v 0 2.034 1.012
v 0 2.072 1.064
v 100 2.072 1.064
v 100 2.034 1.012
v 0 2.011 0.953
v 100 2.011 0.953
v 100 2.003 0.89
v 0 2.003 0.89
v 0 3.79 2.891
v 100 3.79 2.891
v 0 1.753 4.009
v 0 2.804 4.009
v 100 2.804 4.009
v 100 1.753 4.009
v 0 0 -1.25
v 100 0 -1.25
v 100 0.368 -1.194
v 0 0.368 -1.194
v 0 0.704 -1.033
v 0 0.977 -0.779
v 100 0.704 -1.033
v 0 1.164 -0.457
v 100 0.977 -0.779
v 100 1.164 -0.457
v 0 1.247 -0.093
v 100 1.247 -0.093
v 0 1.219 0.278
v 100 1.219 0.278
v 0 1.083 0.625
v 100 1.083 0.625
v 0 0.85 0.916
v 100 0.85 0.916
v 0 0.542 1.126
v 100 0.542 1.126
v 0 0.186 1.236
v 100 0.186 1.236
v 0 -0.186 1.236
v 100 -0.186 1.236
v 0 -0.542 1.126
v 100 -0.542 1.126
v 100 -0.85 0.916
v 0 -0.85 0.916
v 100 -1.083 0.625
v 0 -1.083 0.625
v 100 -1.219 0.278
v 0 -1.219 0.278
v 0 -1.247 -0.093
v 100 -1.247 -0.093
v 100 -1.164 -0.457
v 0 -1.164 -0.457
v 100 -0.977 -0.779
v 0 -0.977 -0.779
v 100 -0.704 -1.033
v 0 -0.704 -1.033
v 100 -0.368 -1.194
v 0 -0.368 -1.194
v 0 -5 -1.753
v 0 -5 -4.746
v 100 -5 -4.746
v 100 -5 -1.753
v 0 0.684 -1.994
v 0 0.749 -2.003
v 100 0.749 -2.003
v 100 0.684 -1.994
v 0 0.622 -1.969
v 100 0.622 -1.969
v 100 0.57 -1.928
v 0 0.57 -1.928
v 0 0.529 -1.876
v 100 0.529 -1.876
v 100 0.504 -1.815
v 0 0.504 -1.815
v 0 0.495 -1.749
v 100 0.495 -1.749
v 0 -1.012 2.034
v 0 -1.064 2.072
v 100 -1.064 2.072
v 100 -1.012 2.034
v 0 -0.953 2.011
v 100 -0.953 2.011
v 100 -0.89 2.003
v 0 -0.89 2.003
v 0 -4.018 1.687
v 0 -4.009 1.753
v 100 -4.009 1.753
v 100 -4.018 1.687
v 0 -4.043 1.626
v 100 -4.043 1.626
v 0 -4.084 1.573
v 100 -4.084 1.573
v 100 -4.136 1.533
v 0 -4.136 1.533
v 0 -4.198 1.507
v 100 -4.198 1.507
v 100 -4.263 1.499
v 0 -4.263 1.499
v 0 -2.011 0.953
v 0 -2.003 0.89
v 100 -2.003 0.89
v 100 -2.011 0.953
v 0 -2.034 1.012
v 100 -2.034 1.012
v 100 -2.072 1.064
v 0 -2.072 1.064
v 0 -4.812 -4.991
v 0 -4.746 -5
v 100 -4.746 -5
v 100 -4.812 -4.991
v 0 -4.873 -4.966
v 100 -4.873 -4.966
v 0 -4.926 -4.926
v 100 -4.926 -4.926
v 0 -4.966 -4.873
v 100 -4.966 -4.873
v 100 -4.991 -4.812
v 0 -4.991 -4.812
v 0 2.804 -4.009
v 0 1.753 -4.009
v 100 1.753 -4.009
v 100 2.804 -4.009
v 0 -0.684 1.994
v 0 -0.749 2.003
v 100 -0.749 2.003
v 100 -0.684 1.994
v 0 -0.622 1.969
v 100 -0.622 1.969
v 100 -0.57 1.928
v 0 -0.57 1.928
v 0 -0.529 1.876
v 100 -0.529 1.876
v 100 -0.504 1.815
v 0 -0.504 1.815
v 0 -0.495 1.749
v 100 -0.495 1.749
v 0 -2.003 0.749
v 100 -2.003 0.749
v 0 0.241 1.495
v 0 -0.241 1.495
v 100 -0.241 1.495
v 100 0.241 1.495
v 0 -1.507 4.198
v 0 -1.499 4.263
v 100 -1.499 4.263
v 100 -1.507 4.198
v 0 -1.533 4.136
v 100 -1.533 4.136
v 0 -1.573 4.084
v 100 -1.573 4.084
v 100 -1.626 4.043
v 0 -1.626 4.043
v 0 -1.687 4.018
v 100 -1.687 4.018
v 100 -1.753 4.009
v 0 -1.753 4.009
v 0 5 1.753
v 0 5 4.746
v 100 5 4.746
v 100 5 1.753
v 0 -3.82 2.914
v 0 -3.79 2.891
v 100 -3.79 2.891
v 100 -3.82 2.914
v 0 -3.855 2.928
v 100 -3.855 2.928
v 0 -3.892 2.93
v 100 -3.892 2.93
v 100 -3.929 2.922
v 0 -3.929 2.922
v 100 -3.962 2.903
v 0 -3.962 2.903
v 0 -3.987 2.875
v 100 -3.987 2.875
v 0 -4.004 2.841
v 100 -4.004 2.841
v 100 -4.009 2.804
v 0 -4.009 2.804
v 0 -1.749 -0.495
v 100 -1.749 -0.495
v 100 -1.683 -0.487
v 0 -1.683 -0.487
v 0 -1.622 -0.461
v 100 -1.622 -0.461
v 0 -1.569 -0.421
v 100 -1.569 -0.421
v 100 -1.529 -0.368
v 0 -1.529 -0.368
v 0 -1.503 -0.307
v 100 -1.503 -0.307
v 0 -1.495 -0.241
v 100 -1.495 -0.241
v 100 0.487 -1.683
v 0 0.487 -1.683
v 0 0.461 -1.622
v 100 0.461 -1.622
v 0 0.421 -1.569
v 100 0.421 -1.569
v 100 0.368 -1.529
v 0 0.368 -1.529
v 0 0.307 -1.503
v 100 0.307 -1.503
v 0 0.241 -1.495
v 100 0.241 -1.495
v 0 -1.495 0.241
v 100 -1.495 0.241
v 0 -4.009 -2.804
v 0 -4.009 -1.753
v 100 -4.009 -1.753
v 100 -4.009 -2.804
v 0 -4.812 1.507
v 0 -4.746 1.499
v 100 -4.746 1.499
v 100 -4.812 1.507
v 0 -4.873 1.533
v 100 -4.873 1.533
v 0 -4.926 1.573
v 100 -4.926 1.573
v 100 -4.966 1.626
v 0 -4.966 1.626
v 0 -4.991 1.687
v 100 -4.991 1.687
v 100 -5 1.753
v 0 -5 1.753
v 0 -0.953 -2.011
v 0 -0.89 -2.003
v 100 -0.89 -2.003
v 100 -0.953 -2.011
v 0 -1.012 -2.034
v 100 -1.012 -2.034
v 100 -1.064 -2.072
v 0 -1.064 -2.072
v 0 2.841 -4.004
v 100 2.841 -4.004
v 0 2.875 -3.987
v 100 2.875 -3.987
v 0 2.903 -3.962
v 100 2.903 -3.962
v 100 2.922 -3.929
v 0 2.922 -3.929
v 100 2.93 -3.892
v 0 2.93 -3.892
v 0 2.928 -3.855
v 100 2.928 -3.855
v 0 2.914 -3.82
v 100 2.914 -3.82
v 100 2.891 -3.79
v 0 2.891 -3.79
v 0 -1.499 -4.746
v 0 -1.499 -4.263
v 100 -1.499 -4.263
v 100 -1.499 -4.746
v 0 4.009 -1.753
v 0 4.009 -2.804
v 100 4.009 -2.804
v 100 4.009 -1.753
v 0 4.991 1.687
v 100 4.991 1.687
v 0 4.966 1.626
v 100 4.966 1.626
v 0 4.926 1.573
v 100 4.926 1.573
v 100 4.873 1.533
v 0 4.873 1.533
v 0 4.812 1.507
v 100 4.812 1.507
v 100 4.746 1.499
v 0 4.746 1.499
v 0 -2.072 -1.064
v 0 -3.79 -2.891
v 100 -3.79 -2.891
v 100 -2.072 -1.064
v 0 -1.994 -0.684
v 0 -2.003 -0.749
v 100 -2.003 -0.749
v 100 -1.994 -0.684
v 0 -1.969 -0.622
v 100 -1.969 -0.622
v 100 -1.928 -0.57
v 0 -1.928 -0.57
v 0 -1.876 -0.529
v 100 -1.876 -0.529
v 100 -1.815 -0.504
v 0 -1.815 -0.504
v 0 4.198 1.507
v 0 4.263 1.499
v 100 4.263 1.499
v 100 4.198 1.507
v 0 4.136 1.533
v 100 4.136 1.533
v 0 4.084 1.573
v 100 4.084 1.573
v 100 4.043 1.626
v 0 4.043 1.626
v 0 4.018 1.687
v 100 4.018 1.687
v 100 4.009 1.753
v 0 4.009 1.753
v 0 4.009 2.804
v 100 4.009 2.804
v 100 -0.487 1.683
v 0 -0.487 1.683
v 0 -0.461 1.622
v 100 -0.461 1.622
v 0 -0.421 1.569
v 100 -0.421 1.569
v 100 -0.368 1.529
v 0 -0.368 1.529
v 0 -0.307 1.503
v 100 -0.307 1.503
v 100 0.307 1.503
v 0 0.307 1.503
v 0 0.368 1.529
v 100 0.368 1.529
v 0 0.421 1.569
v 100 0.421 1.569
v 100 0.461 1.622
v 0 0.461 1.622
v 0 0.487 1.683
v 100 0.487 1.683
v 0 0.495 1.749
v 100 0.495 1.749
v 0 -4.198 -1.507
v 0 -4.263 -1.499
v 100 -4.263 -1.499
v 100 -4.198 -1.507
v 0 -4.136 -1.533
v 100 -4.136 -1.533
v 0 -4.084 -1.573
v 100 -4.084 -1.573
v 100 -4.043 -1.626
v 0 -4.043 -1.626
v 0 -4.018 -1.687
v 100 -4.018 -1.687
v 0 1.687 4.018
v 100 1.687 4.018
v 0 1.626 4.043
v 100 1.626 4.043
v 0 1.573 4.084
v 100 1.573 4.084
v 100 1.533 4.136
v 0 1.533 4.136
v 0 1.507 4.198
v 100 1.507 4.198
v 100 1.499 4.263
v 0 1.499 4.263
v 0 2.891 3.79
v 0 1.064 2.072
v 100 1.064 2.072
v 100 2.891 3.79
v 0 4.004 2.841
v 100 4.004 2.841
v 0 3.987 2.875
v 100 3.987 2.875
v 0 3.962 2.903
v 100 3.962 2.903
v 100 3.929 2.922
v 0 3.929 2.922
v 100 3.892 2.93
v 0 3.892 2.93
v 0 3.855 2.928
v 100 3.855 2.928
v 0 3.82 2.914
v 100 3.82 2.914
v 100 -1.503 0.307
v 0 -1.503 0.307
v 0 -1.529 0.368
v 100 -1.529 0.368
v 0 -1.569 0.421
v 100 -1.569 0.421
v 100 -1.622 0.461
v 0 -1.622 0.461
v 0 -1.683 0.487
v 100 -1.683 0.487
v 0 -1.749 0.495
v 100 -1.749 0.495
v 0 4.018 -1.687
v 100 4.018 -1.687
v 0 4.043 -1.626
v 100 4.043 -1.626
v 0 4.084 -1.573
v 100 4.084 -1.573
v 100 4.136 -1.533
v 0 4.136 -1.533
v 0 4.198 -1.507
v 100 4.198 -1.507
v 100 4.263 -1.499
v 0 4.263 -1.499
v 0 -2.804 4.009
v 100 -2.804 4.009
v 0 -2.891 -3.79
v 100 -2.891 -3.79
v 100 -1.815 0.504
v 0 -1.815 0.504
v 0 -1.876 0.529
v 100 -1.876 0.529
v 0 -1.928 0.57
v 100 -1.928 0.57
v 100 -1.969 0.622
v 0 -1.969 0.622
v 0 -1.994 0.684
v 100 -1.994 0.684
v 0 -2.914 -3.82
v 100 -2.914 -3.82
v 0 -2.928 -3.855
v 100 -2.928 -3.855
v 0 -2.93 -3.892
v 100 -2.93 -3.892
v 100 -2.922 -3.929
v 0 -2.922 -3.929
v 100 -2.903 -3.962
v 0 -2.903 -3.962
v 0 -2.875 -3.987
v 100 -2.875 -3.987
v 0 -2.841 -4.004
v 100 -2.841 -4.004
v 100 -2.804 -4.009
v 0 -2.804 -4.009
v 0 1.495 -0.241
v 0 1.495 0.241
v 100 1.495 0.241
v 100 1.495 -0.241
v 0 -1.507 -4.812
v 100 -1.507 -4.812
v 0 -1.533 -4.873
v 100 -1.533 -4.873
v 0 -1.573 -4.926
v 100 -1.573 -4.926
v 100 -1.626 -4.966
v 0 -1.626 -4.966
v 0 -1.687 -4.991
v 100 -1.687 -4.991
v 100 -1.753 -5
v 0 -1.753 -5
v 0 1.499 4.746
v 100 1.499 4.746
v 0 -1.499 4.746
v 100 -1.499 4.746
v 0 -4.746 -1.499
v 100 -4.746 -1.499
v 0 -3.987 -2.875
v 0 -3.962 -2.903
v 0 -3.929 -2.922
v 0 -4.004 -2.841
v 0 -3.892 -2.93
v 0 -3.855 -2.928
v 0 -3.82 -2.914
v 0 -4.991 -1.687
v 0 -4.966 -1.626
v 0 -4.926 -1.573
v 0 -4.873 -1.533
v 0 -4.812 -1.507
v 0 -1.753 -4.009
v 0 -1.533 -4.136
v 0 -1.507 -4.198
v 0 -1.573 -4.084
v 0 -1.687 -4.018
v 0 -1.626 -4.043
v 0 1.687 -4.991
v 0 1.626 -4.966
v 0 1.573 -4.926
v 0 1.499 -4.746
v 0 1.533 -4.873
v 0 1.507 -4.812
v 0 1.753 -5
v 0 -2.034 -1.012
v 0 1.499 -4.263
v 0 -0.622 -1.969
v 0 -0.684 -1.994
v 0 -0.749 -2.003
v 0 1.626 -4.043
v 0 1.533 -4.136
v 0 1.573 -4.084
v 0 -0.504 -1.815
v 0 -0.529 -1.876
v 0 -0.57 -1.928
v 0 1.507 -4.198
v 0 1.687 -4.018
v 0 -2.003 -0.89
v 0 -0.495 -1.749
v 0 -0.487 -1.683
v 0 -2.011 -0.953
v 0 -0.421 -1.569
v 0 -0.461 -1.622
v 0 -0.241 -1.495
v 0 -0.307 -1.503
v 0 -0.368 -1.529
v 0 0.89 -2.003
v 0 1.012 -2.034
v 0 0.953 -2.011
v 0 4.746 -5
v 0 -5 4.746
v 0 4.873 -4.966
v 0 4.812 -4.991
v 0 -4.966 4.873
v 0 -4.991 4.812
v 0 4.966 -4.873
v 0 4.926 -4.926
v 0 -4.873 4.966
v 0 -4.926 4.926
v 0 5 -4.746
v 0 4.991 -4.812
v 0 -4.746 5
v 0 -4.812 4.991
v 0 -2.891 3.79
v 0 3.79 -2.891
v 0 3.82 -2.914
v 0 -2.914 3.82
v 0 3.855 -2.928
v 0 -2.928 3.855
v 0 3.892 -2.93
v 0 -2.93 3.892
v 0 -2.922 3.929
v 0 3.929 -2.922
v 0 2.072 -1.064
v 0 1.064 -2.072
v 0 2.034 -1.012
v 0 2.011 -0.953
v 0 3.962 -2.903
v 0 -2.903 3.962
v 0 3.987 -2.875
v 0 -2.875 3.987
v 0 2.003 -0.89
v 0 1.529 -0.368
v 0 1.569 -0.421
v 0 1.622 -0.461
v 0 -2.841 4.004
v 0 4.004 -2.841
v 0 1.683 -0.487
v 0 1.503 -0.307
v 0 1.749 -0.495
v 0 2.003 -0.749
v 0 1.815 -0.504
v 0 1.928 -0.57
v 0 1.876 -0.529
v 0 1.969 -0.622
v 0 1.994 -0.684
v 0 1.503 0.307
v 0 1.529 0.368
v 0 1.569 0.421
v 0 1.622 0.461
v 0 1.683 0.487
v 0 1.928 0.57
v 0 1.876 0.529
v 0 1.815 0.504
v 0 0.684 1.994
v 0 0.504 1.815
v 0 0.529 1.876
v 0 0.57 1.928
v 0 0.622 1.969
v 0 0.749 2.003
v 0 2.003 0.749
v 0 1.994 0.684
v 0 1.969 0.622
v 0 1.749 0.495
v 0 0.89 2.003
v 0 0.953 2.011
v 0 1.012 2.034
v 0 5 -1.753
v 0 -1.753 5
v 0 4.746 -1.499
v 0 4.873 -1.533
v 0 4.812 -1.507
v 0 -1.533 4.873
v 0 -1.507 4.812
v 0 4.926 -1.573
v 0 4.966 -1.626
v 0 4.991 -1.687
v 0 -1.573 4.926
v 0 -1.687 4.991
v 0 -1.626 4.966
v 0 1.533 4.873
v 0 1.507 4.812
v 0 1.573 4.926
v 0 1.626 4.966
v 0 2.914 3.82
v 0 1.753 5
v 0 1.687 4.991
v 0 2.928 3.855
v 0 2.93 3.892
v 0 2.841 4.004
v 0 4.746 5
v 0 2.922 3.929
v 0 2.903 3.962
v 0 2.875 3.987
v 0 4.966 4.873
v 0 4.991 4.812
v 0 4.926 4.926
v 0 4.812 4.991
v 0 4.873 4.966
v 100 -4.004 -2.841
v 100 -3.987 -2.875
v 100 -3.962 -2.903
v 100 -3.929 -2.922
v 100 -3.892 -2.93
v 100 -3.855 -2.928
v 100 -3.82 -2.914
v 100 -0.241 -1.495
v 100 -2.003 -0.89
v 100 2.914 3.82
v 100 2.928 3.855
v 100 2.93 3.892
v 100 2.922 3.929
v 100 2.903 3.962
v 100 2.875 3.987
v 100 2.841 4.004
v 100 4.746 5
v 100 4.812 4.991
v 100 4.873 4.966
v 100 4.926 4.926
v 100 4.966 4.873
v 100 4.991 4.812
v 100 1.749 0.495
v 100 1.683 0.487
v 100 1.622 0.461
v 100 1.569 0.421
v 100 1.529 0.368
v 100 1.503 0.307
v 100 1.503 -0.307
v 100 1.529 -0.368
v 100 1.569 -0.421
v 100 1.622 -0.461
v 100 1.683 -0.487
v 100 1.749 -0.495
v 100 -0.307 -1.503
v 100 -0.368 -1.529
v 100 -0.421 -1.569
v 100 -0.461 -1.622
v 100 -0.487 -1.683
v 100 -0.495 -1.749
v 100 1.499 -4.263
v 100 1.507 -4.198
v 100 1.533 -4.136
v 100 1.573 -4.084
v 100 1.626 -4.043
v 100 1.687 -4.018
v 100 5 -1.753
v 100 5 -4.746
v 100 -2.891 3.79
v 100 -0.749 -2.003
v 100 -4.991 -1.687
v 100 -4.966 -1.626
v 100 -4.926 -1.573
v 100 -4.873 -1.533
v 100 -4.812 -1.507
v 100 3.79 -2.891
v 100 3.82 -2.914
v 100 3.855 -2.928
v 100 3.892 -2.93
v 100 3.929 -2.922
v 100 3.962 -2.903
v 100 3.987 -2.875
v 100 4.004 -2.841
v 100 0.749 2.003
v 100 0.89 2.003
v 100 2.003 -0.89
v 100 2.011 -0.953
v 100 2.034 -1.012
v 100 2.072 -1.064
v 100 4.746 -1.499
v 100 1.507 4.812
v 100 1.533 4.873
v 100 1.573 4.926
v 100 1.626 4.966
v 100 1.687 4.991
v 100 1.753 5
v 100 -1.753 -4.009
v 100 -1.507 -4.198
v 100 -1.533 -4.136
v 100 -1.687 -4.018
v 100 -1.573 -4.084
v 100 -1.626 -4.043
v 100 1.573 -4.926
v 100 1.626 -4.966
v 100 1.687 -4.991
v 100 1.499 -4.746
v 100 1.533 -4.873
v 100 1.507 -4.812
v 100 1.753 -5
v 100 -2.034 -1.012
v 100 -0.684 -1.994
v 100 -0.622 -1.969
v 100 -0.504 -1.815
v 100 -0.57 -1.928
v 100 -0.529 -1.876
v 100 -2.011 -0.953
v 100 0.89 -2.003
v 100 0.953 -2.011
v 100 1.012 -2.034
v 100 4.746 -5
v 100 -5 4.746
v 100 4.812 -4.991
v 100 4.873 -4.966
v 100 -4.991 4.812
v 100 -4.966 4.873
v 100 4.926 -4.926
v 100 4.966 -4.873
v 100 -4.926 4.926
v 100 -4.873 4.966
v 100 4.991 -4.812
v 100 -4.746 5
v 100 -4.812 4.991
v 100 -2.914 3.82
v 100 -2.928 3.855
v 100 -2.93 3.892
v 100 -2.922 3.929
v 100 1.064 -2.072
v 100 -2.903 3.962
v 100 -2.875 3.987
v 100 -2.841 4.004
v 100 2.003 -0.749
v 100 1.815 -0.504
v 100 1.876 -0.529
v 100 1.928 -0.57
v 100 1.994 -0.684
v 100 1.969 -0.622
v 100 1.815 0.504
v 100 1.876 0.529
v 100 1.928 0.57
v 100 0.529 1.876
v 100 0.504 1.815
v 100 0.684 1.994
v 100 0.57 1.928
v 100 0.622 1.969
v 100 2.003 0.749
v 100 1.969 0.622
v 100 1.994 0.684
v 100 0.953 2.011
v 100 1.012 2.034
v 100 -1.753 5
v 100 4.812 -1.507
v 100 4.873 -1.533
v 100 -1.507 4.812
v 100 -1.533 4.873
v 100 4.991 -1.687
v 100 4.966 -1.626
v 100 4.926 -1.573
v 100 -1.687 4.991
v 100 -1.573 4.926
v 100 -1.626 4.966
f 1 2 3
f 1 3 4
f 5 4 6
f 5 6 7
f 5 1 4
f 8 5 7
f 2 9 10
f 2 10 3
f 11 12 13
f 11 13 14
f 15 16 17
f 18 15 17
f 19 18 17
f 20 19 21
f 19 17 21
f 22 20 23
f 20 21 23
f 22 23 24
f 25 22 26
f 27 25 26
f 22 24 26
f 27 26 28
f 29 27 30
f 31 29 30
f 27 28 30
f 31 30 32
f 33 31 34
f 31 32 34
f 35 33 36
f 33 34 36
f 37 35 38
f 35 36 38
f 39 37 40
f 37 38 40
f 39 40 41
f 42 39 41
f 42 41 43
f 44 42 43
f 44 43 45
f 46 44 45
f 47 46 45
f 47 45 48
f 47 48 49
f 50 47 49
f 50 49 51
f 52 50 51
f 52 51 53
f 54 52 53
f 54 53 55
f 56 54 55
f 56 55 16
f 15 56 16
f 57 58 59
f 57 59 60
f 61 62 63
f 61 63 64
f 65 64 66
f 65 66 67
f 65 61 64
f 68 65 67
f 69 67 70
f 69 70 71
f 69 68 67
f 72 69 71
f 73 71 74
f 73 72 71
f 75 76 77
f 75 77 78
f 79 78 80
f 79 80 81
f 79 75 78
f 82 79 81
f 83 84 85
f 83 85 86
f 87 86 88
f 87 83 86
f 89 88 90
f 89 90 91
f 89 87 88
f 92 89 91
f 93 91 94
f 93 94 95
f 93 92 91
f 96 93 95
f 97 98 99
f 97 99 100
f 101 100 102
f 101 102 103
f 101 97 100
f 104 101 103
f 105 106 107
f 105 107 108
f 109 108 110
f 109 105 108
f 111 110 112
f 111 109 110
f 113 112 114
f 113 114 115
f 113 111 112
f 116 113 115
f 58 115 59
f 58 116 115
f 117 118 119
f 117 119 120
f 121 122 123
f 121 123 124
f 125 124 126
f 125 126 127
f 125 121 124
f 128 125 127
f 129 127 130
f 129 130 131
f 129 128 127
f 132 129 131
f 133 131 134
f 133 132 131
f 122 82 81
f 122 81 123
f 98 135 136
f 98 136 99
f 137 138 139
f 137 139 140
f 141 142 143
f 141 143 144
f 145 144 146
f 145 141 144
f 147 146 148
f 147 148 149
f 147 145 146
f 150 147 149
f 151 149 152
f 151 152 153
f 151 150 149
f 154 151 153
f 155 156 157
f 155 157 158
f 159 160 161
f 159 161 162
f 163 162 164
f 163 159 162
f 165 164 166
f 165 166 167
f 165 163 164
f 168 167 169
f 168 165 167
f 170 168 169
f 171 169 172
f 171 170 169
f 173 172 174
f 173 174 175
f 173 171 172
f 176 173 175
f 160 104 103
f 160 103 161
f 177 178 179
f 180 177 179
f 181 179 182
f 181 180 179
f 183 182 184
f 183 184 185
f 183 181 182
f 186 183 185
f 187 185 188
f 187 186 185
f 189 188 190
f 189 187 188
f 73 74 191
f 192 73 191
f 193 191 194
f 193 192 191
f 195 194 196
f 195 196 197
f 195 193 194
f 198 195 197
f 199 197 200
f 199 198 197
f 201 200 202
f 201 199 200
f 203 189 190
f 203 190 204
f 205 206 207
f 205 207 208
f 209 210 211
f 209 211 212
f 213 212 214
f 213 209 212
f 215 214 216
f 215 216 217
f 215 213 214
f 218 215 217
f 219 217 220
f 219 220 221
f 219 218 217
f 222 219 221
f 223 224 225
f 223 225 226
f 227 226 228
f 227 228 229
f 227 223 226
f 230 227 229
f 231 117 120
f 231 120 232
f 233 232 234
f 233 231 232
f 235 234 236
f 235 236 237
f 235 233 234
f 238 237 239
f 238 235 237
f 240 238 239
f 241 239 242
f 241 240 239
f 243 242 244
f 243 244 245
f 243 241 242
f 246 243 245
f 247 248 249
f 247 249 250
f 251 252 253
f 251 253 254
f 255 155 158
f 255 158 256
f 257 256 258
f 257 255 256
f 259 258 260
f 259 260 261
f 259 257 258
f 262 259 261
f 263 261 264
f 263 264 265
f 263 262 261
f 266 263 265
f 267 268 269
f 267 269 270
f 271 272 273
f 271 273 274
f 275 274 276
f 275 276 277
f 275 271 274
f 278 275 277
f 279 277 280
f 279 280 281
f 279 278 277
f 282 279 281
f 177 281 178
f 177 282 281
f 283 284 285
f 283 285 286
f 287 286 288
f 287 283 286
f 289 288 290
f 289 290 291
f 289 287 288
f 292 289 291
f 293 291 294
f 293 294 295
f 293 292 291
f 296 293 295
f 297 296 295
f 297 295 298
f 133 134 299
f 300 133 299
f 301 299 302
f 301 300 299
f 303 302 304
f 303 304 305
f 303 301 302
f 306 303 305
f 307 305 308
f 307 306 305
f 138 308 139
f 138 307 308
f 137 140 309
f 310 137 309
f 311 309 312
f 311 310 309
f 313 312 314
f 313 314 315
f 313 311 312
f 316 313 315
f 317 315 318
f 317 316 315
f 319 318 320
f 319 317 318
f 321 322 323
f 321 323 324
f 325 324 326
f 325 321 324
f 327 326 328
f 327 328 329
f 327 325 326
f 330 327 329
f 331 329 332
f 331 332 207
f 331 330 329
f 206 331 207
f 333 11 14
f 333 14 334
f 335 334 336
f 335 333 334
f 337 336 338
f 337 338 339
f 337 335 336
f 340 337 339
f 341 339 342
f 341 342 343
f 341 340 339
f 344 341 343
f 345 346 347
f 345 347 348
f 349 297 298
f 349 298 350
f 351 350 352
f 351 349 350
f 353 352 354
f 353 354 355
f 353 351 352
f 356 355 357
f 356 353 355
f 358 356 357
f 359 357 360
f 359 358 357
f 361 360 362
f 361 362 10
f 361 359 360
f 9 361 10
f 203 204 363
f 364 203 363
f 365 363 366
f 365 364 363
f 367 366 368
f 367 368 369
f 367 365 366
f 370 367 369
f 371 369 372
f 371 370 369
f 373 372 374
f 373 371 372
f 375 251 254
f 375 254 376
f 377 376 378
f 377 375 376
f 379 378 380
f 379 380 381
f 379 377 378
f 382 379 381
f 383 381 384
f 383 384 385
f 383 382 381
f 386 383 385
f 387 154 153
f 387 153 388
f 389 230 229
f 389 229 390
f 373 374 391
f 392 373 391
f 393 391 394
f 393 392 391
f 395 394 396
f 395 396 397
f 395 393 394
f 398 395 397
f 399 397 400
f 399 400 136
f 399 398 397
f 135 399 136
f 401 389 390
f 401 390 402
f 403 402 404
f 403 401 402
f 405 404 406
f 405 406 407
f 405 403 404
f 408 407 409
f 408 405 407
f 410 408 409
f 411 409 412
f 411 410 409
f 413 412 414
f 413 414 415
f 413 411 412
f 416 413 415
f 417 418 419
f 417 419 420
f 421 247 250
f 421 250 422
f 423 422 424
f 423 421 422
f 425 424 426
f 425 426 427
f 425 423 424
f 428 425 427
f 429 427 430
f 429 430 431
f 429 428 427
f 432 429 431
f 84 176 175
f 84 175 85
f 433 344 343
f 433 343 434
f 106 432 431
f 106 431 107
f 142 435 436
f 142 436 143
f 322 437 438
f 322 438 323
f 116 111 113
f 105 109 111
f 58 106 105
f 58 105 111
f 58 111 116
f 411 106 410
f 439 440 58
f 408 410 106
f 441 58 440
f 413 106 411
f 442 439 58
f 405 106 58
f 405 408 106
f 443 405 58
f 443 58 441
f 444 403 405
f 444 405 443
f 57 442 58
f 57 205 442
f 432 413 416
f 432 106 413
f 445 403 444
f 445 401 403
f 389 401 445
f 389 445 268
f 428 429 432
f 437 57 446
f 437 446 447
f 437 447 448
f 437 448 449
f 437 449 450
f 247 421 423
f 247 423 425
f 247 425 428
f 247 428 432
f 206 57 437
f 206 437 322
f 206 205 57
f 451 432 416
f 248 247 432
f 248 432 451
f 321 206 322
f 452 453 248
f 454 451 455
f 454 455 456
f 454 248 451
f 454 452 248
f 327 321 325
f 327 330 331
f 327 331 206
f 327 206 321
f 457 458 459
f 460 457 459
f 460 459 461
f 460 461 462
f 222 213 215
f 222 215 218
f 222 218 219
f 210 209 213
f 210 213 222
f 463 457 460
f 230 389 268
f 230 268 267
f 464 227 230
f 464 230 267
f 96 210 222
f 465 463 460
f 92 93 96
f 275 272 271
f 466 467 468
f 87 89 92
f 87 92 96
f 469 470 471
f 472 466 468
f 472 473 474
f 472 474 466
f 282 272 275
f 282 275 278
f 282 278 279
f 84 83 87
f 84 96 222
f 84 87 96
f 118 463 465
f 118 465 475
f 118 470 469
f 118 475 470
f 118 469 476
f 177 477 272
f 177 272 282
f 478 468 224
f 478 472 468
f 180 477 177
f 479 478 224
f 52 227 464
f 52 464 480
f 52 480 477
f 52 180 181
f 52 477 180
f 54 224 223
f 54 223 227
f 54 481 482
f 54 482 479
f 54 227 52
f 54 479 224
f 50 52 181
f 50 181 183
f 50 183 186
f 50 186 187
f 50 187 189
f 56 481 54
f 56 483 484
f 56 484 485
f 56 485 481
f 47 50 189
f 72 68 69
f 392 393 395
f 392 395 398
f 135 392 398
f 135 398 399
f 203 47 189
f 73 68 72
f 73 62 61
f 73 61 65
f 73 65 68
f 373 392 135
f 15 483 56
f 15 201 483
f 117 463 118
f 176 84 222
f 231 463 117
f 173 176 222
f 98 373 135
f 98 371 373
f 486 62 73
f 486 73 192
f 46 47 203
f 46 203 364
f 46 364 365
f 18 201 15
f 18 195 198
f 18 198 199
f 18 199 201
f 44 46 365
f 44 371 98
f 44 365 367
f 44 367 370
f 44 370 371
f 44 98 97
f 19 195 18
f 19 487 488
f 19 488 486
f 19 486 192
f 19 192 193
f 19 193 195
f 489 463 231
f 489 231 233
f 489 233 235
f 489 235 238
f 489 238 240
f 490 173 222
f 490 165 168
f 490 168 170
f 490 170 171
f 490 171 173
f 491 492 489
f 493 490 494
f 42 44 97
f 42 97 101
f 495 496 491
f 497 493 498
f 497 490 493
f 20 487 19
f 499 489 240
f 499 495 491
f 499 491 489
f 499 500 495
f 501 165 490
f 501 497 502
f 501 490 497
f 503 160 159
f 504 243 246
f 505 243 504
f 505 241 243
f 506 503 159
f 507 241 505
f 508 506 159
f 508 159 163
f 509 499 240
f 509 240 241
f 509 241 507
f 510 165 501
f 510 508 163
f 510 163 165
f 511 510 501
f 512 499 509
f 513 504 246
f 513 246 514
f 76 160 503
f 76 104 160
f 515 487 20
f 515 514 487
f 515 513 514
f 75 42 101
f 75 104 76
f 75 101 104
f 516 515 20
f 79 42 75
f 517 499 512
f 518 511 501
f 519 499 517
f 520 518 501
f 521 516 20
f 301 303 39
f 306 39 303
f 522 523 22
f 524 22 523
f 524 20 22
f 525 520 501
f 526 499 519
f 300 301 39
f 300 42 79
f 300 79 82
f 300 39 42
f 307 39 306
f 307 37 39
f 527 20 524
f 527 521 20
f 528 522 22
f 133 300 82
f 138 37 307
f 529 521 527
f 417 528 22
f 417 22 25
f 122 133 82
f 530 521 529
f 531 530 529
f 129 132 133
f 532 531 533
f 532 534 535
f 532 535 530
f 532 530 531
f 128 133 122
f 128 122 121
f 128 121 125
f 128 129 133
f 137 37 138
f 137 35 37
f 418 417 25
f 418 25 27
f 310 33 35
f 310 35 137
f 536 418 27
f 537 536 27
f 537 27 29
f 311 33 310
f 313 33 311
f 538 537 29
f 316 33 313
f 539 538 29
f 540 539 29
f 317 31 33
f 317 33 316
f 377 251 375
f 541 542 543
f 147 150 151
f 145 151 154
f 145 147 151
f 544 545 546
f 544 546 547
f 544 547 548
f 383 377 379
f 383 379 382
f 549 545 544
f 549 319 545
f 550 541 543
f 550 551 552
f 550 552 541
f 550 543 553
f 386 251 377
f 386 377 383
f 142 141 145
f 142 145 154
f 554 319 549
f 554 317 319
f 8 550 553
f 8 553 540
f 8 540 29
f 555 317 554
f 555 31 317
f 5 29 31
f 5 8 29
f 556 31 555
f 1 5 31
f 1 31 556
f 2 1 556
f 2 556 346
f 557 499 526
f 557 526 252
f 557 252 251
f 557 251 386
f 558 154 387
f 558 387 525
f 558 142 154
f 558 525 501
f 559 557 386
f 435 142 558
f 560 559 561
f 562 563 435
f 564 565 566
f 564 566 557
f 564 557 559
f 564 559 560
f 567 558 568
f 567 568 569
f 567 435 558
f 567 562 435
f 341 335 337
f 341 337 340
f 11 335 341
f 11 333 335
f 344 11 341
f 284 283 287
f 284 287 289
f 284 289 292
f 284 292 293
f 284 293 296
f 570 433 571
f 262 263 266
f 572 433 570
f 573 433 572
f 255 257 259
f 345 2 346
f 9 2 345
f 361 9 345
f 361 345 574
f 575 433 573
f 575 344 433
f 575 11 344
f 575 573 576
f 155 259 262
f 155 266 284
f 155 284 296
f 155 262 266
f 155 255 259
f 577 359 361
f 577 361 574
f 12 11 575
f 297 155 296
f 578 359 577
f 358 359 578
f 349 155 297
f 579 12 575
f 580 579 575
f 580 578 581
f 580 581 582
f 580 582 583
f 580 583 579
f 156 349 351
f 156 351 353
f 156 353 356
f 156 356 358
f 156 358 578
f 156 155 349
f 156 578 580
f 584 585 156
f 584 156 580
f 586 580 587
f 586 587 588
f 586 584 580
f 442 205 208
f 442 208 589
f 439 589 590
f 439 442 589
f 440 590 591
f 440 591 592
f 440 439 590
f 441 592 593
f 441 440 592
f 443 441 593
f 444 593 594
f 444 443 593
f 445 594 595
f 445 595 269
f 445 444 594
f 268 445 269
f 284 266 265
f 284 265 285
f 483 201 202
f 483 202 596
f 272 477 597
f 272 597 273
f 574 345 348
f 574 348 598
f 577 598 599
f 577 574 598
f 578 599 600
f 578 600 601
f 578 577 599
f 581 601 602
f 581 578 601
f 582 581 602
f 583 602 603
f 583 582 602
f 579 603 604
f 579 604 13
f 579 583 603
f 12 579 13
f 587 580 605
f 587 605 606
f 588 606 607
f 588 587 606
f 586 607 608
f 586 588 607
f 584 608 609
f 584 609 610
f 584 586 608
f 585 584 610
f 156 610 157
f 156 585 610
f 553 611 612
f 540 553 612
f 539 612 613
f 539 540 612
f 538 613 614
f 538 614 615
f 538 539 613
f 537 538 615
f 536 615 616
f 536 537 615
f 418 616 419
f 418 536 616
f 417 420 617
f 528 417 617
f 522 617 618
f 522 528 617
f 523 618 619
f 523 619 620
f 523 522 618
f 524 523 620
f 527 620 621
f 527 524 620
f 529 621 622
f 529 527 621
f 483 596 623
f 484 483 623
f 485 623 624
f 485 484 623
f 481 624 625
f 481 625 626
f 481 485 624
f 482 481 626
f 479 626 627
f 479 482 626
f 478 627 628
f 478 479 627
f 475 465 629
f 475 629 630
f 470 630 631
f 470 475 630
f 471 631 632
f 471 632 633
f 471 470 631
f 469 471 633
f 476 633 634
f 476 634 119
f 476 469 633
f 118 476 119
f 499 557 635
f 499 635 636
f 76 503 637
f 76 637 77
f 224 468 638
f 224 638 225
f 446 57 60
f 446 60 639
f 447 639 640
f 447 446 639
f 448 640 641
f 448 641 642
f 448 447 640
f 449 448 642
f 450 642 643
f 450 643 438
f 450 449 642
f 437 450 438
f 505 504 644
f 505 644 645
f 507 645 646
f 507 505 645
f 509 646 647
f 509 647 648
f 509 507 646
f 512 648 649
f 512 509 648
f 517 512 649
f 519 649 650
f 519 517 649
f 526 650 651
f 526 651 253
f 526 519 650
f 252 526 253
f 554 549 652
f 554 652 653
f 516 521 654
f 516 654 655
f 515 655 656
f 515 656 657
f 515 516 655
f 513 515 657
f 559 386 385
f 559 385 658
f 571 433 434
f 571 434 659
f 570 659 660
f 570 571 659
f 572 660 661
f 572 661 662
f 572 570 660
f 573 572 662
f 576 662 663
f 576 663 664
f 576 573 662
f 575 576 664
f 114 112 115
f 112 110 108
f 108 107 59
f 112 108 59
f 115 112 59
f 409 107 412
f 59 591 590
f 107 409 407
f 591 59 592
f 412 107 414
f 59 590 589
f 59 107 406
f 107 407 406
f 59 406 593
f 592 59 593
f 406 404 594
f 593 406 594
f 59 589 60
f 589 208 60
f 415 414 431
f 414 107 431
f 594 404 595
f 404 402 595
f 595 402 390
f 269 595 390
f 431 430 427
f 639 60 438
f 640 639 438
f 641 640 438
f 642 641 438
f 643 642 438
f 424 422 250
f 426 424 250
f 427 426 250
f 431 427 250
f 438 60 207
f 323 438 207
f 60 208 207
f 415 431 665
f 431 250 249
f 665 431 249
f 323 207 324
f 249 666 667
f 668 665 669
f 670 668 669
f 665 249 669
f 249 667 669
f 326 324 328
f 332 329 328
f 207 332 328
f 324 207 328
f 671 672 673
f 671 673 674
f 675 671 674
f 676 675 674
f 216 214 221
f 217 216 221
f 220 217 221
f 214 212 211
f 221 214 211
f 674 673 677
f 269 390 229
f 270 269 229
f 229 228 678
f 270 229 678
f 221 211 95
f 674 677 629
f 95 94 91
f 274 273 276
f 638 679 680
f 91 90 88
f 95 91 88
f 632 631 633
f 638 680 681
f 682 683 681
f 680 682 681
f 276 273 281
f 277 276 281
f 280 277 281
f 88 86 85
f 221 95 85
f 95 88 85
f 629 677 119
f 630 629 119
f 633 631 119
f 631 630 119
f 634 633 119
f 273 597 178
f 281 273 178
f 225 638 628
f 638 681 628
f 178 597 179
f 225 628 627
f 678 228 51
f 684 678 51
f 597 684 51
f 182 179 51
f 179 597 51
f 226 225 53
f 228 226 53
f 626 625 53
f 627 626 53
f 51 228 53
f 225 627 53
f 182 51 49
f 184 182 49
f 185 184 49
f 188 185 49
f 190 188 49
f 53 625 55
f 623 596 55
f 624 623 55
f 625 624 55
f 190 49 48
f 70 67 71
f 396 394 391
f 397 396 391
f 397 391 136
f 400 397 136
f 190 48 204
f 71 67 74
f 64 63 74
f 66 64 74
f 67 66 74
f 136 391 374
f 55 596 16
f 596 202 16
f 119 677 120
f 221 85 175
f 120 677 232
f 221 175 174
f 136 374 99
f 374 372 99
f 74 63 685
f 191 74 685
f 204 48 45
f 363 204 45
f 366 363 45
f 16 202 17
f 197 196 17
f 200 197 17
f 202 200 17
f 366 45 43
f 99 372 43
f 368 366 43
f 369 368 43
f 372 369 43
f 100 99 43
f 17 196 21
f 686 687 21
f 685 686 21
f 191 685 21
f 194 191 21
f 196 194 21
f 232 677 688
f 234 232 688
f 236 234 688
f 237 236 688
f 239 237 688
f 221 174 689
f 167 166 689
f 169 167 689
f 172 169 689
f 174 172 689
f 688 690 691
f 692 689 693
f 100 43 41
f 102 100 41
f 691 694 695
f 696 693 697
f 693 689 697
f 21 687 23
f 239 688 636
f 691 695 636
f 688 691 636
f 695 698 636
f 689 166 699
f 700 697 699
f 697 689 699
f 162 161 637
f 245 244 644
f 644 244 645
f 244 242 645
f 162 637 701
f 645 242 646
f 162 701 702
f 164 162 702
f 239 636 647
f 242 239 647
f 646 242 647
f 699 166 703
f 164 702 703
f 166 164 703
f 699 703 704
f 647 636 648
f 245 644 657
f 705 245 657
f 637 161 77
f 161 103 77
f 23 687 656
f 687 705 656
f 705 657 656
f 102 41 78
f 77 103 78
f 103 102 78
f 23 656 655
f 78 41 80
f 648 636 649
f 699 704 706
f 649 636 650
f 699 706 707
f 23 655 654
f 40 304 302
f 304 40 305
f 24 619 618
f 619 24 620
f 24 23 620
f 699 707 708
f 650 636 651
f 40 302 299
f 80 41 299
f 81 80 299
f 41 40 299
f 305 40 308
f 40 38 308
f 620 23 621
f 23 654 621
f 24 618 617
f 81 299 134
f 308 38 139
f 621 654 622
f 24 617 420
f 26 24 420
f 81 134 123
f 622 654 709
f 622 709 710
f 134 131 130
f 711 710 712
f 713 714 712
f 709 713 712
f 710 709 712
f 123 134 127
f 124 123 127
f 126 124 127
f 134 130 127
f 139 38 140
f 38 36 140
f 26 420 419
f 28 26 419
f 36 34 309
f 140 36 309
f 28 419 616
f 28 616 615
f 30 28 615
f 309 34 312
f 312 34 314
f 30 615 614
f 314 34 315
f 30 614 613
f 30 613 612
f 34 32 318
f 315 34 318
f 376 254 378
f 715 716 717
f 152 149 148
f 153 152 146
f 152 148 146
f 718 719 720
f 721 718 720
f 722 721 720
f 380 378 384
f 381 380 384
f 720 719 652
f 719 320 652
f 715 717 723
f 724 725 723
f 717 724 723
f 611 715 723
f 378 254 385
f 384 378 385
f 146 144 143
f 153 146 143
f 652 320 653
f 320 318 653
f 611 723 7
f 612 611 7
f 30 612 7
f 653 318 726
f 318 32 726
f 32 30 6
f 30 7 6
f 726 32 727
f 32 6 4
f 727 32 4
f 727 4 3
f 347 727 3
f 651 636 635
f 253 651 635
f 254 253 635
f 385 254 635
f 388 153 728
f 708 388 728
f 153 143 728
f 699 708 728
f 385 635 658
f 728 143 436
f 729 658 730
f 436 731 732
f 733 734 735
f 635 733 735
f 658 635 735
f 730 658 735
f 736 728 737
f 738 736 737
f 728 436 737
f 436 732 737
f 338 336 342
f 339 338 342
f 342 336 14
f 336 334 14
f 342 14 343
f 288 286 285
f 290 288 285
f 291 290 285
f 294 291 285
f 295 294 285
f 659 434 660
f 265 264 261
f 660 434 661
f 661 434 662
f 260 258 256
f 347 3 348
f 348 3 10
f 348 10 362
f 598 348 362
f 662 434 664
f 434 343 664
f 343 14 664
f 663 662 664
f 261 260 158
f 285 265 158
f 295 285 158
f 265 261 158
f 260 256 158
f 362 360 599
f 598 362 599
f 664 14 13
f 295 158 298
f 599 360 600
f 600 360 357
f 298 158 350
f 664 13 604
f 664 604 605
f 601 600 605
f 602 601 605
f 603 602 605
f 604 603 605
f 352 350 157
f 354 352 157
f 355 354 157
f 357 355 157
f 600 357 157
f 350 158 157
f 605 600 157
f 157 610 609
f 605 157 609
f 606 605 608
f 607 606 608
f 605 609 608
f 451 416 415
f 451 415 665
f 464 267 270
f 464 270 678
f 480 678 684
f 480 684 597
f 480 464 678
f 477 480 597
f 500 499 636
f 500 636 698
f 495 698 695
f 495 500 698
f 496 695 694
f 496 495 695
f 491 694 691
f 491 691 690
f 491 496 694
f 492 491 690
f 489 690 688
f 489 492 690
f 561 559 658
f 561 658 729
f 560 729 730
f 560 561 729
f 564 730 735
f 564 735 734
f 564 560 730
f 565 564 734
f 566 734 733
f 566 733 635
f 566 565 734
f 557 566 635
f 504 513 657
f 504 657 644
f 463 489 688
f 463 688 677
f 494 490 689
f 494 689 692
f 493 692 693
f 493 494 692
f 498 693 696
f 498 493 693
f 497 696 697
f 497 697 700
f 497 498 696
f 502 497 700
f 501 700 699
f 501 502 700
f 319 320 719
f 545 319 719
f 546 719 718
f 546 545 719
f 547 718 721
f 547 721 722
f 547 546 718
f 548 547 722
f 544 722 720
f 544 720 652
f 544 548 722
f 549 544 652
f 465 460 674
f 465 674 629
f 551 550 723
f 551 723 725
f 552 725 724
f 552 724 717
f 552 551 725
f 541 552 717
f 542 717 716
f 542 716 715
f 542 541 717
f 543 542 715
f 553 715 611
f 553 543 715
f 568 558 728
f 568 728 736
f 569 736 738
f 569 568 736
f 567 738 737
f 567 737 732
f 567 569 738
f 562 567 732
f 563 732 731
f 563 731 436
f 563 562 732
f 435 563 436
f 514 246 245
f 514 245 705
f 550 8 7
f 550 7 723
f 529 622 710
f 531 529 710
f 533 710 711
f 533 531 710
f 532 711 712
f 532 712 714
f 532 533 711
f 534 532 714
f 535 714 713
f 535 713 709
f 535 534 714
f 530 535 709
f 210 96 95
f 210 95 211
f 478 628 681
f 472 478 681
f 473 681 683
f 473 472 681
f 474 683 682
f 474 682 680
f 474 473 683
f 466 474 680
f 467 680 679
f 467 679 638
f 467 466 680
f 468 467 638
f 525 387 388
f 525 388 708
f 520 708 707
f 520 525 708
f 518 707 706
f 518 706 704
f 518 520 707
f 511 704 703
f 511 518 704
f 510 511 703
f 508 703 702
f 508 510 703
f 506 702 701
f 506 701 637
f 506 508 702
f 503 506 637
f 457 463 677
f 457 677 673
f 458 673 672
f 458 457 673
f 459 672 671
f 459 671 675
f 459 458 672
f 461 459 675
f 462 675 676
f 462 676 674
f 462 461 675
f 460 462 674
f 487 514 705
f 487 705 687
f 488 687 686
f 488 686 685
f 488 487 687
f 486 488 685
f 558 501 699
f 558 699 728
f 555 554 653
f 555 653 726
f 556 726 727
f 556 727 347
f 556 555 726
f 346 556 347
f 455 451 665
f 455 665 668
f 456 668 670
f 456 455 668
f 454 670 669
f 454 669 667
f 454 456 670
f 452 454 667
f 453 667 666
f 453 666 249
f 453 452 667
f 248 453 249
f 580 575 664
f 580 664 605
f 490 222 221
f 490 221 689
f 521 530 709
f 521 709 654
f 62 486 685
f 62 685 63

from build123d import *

# Parameters (mm, degrees)
ESTRUSIONE_ESTRUSIONE1_DEPTH = 100
FORO_FILETTATO_M3X0_5_1_D    = 2.5


with BuildPart() as part:
    # Sketch1 → Estrusione-Estrusione1 (new body)
    with BuildSketch(Plane(origin=(0, 0, 0), x_dir=(0, 0, -1), z_dir=(1, 0, 0))):
        with BuildLine():
            Line((-0.2413, 1.4948), (0.2413, 1.4948))
            ThreePointArc((0.2413, 1.4948), (0.420905122, 1.569194878), (0.4953, 1.7488))
            ThreePointArc((0.4953, 1.7488), (0.569694878, 1.928405122), (0.7493, 2.0028))
            Line((0.7493, 2.0028), (0.889923986, 2.0028))
            ThreePointArc((0.889923986, 2.0028), (0.983516259, 2.020671886), (1.063937899, 2.071772548))
            Line((1.063937899, 2.071772548), (2.890793, 3.789886274))
            ThreePointArc((2.890793, 3.789886274), (2.921850101, 3.929196137), (2.803786044, 4.0094))
            Line((2.803786044, 4.0094), (1.7526, 4.0094))
            ThreePointArc((1.7526, 4.0094), (1.572994878, 4.083794878), (1.4986, 4.2634))
            Line((1.4986, 4.2634), (1.4986, 4.746))
            ThreePointArc((1.4986, 4.746), (1.572994878, 4.925605122), (1.7526, 5))
            Line((1.7526, 5), (4.746, 5))
            ThreePointArc((4.746, 5), (4.925605122, 4.925605122), (5, 4.746))
            Line((5, 4.746), (5, 1.7526))
            ThreePointArc((5, 1.7526), (4.925605122, 1.572994878), (4.746, 1.4986))
            Line((4.746, 1.4986), (4.2634, 1.4986))
            ThreePointArc((4.2634, 1.4986), (4.083794878, 1.572994878), (4.0094, 1.7526))
            Line((4.0094, 1.7526), (4.0094, 2.803786044))
            ThreePointArc((4.0094, 2.803786044), (3.929196137, 2.921850101), (3.789886274, 2.890793))
            Line((3.789886274, 2.890793), (2.071772548, 1.063937899))
            ThreePointArc((2.071772548, 1.063937899), (2.020671886, 0.983516259), (2.0028, 0.889923986))
            Line((2.0028, 0.889923986), (2.0028, 0.7493))
            ThreePointArc((2.0028, 0.7493), (1.928405122, 0.569694878), (1.7488, 0.4953))
            ThreePointArc((1.7488, 0.4953), (1.569194878, 0.420905122), (1.4948, 0.2413))
            Line((1.4948, 0.2413), (1.4948, -0.2413))
            ThreePointArc((1.4948, -0.2413), (1.569194878, -0.420905122), (1.7488, -0.4953))
            ThreePointArc((1.7488, -0.4953), (1.928405122, -0.569694878), (2.0028, -0.7493))
            Line((2.0028, -0.7493), (2.0028, -0.889923986))
            ThreePointArc((2.0028, -0.889923986), (2.020671886, -0.983516259), (2.071772548, -1.063937899))
            Line((2.071772548, -1.063937899), (3.789886274, -2.890793))
            ThreePointArc((3.789886274, -2.890793), (3.929196137, -2.921850101), (4.0094, -2.803786044))
            Line((4.0094, -2.803786044), (4.0094, -1.7526))
            ThreePointArc((4.0094, -1.7526), (4.083794878, -1.572994878), (4.2634, -1.4986))
            Line((4.2634, -1.4986), (4.746, -1.4986))
            ThreePointArc((4.746, -1.4986), (4.925605122, -1.572994878), (5, -1.7526))
            Line((5, -1.7526), (5, -4.746))
            ThreePointArc((5, -4.746), (4.925605122, -4.925605122), (4.746, -5))
            Line((4.746, -5), (1.7526, -5))
            ThreePointArc((1.7526, -5), (1.572994878, -4.925605122), (1.4986, -4.746))
            Line((1.4986, -4.746), (1.4986, -4.2634))
            ThreePointArc((1.4986, -4.2634), (1.572994878, -4.083794878), (1.7526, -4.0094))
            Line((1.7526, -4.0094), (2.803786044, -4.0094))
            ThreePointArc((2.803786044, -4.0094), (2.921850101, -3.929196137), (2.890793, -3.789886274))
            Line((2.890793, -3.789886274), (1.063937899, -2.071772548))
            ThreePointArc((1.063937899, -2.071772548), (0.983516259, -2.020671886), (0.889923986, -2.0028))
            Line((0.889923986, -2.0028), (0.7493, -2.0028))
            ThreePointArc((0.7493, -2.0028), (0.569694878, -1.928405122), (0.4953, -1.7488))
            ThreePointArc((0.4953, -1.7488), (0.420905122, -1.569194878), (0.2413, -1.4948))
            Line((0.2413, -1.4948), (-0.2413, -1.4948))
            ThreePointArc((-0.2413, -1.4948), (-0.420905122, -1.569194878), (-0.4953, -1.7488))
            ThreePointArc((-0.4953, -1.7488), (-0.569694878, -1.928405122), (-0.7493, -2.0028))
            Line((-0.7493, -2.0028), (-0.889923986, -2.0028))
            ThreePointArc((-0.889923986, -2.0028), (-0.983516259, -2.020671886), (-1.063937899, -2.071772548))
            Line((-1.063937899, -2.071772548), (-2.890793, -3.789886274))
            ThreePointArc((-2.890793, -3.789886274), (-2.921850101, -3.929196137), (-2.803786044, -4.0094))
            Line((-2.803786044, -4.0094), (-1.7526, -4.0094))
            ThreePointArc((-1.7526, -4.0094), (-1.572994878, -4.083794878), (-1.4986, -4.2634))
            Line((-1.4986, -4.2634), (-1.4986, -4.746))
            ThreePointArc((-1.4986, -4.746), (-1.572994878, -4.925605122), (-1.7526, -5))
            Line((-1.7526, -5), (-4.746, -5))
            ThreePointArc((-4.746, -5), (-4.925605122, -4.925605122), (-5, -4.746))
            Line((-5, -4.746), (-5, -1.7526))
            ThreePointArc((-5, -1.7526), (-4.925605122, -1.572994878), (-4.746, -1.4986))
            Line((-4.746, -1.4986), (-4.2634, -1.4986))
            ThreePointArc((-4.2634, -1.4986), (-4.083794878, -1.572994878), (-4.0094, -1.7526))
            Line((-4.0094, -1.7526), (-4.0094, -2.803786044))
            ThreePointArc((-4.0094, -2.803786044), (-3.929196137, -2.921850101), (-3.789886274, -2.890793))
            Line((-3.789886274, -2.890793), (-2.071772548, -1.063937899))
            ThreePointArc((-2.071772548, -1.063937899), (-2.020671886, -0.983516259), (-2.0028, -0.889923986))
            Line((-2.0028, -0.889923986), (-2.0028, -0.7493))
            ThreePointArc((-2.0028, -0.7493), (-1.928405122, -0.569694878), (-1.7488, -0.4953))
            ThreePointArc((-1.7488, -0.4953), (-1.569194878, -0.420905122), (-1.4948, -0.2413))
            Line((-1.4948, -0.2413), (-1.4948, 0.2413))
            ThreePointArc((-1.4948, 0.2413), (-1.569194878, 0.420905122), (-1.7488, 0.4953))
            ThreePointArc((-1.7488, 0.4953), (-1.928405122, 0.569694878), (-2.0028, 0.7493))
            Line((-2.0028, 0.7493), (-2.0028, 0.889923986))
            ThreePointArc((-2.0028, 0.889923986), (-2.020671886, 0.983516259), (-2.071772548, 1.063937899))
            Line((-2.071772548, 1.063937899), (-3.789886274, 2.890793))
            ThreePointArc((-3.789886274, 2.890793), (-3.929196137, 2.921850101), (-4.0094, 2.803786044))
            Line((-4.0094, 2.803786044), (-4.0094, 1.7526))
            ThreePointArc((-4.0094, 1.7526), (-4.083794878, 1.572994878), (-4.2634, 1.4986))
            Line((-4.2634, 1.4986), (-4.746, 1.4986))
            ThreePointArc((-4.746, 1.4986), (-4.925605122, 1.572994878), (-5, 1.7526))
            Line((-5, 1.7526), (-5, 4.746))
            ThreePointArc((-5, 4.746), (-4.925605122, 4.925605122), (-4.746, 5))
            Line((-4.746, 5), (-1.7526, 5))
            ThreePointArc((-1.7526, 5), (-1.572994878, 4.925605122), (-1.4986, 4.746))
            Line((-1.4986, 4.746), (-1.4986, 4.2634))
            ThreePointArc((-1.4986, 4.2634), (-1.572994878, 4.083794878), (-1.7526, 4.0094))
            Line((-1.7526, 4.0094), (-2.803786044, 4.0094))
            ThreePointArc((-2.803786044, 4.0094), (-2.921850101, 3.929196137), (-2.890793, 3.789886274))
            Line((-2.890793, 3.789886274), (-1.063937899, 2.071772548))
            ThreePointArc((-1.063937899, 2.071772548), (-0.983516259, 2.020671886), (-0.889923986, 2.0028))
            Line((-0.889923986, 2.0028), (-0.7493, 2.0028))
            ThreePointArc((-0.7493, 2.0028), (-0.569694878, 1.928405122), (-0.4953, 1.7488))
            ThreePointArc((-0.4953, 1.7488), (-0.420905122, 1.569194878), (-0.2413, 1.4948))
        make_face()
    extrude(amount=ESTRUSIONE_ESTRUSIONE1_DEPTH)

    # Foro filettato M3x0.5-1 (through all)
    with Locations(Plane.ZY):
        with Locations((0, 0)):
            Hole(FORO_FILETTATO_M3X0_5_1_D / 2)


solid = part.part
